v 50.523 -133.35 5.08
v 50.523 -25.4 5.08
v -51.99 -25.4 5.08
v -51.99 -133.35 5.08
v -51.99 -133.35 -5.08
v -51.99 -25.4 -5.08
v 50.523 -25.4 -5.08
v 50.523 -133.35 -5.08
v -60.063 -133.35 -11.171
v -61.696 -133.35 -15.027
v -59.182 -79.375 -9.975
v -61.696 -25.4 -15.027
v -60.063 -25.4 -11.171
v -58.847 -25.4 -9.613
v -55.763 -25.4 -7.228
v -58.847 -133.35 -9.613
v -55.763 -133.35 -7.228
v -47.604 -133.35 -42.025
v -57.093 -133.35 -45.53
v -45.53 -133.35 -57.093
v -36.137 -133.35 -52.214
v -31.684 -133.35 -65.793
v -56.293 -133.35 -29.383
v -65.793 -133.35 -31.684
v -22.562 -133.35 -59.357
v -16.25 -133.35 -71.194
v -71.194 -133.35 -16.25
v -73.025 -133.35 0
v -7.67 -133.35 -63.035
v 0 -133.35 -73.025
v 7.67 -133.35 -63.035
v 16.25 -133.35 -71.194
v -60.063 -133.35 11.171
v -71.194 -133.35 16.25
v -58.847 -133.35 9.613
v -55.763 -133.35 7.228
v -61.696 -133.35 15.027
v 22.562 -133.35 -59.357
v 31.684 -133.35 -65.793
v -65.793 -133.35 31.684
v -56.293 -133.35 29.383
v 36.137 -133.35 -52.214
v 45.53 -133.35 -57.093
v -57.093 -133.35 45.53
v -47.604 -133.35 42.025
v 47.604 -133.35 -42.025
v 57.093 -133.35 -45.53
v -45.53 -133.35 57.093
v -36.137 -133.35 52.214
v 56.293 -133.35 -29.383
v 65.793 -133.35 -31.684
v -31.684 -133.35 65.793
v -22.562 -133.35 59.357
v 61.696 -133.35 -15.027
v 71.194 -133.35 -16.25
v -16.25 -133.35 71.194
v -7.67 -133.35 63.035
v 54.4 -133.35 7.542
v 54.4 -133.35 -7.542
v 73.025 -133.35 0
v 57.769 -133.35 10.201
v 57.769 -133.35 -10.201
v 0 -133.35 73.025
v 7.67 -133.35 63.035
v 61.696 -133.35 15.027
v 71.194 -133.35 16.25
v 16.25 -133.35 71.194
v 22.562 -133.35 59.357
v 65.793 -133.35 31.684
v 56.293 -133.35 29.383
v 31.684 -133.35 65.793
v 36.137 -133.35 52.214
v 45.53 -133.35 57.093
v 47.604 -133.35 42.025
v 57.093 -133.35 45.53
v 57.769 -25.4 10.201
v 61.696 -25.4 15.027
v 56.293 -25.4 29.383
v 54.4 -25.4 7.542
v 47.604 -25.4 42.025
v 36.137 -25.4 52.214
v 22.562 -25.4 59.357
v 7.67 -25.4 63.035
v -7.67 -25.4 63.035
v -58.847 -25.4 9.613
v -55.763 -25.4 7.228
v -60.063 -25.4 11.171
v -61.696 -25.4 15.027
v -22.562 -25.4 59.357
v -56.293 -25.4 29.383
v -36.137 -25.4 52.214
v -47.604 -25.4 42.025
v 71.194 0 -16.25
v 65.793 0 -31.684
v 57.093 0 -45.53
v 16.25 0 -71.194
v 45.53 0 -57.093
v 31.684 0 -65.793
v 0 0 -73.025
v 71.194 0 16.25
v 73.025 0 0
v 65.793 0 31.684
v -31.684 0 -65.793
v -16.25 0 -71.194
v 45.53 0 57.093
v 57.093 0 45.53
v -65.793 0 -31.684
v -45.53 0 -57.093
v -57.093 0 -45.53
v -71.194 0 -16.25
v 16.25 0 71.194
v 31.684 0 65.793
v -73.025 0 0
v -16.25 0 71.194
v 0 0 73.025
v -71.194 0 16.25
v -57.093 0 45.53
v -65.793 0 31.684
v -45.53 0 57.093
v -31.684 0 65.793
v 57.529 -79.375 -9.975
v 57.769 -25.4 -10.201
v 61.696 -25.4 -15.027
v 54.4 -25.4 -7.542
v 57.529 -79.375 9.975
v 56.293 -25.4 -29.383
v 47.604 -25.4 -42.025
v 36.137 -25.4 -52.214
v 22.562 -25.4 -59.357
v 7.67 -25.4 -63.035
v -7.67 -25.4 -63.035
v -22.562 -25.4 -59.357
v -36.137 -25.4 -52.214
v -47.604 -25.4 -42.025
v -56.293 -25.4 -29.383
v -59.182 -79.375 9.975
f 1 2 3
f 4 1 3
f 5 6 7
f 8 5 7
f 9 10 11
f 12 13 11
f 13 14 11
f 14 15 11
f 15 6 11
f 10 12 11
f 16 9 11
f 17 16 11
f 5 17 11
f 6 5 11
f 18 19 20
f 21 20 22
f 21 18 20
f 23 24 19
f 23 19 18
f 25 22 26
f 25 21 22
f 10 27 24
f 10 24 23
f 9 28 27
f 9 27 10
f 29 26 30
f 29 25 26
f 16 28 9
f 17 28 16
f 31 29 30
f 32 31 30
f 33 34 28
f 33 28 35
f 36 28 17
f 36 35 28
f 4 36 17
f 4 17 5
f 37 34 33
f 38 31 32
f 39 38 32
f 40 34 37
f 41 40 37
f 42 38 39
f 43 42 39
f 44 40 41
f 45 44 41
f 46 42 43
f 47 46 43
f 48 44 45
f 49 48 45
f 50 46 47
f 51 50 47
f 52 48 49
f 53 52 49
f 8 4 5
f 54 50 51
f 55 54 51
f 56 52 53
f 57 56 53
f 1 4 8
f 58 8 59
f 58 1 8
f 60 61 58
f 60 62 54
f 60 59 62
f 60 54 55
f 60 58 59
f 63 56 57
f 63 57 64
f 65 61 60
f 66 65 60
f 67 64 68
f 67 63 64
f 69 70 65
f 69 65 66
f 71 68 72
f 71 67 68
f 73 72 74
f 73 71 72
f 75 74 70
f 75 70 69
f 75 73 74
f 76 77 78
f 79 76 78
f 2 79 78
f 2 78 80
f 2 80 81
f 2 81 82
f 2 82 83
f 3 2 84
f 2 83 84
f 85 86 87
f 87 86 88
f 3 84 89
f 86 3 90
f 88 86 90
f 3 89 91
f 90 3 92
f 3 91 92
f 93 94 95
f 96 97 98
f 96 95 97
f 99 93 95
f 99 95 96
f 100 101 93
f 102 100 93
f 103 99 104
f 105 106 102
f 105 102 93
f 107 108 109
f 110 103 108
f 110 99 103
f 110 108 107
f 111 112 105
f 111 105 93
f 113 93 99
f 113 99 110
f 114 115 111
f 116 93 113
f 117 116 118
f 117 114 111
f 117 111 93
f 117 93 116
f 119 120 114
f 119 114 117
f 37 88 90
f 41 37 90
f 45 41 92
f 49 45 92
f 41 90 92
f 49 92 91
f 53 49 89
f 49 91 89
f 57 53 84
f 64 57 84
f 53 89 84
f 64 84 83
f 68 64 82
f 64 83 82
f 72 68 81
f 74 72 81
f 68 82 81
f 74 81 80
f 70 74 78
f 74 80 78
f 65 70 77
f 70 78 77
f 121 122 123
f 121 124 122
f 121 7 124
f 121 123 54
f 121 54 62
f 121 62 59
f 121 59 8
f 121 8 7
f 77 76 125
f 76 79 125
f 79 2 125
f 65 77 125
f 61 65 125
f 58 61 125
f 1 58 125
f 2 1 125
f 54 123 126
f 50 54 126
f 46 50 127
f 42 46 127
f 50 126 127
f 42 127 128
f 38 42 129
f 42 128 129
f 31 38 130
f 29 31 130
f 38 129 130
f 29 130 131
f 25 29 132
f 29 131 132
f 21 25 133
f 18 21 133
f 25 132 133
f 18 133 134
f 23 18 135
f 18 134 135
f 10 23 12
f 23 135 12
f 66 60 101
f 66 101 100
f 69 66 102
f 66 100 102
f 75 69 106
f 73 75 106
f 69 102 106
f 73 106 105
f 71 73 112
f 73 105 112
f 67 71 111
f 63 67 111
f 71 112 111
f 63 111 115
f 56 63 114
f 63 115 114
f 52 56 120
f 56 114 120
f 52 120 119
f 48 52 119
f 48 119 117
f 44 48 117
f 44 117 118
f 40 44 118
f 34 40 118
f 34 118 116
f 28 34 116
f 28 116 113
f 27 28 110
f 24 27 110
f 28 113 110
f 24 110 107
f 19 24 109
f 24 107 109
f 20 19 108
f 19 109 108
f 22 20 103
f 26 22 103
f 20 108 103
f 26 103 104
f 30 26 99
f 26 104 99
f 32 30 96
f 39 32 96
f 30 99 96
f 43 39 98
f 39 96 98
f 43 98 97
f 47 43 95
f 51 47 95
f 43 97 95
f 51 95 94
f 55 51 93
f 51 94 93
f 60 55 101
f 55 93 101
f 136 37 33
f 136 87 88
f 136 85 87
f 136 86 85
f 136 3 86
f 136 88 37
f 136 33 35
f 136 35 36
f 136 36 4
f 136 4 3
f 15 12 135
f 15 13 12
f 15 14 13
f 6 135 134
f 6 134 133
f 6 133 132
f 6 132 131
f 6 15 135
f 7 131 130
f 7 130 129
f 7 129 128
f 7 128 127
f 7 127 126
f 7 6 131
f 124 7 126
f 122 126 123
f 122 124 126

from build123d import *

# Parameters (mm, degrees)
F0_R     = 73.025
F1_DEPTH = 133.35
F2_DEPTH = 25.4


with BuildPart() as f1:
    # F0 (on Front) → F1 (new body)
    with BuildSketch(Plane.XZ):
        Circle(F0_R)
        with BuildLine():
            ThreePointArc((63.2964738354, 5.08), (63.4490980572, 2.5420377112), (63.5, 0))
            ThreePointArc((63.5, 0), (63.4490980572, -2.5420377112), (63.2964738354, -5.08))
            ThreePointArc((63.2964738354, -5.08), (62.6939870382, -10.0853353566), (61.696322928, -15.0271000916))
            ThreePointArc((61.696322928, -15.0271000916), (0, -63.5), (-61.696322928, -15.0271000916))
            ThreePointArc((-61.696322928, -15.0271000916), (-62.6939870382, -10.0853353566), (-63.2964738354, -5.08))
            ThreePointArc((-63.2964738354, -5.08), (-63.5, 0), (-63.2964738354, 5.08))
            ThreePointArc((-63.2964738354, 5.08), (-62.6939870382, 10.0853353566), (-61.696322928, 15.0271000916))
            ThreePointArc((-61.696322928, 15.0271000916), (0, 63.5), (61.696322928, 15.0271000916))
            ThreePointArc((61.696322928, 15.0271000916), (62.6939870382, 10.0853353566), (63.2964738354, 5.08))
        make_face(mode=Mode.SUBTRACT)
        with BuildLine():
            ThreePointArc((63.2964738354, -5.08), (63.4490980572, -2.5420377112), (63.5, 0))
            ThreePointArc((63.5, 0), (63.4490980572, 2.5420377112), (63.2964738354, 5.08))
            Line((63.2964738354, 5.08), (50.5231209099, 5.08))
            Line((50.5231209099, 5.08), (-8.6646769196, 5.08))
            Line((-8.6646769196, 5.08), (-51.9901923835, 5.08))
            Line((-51.9901923835, 5.08), (-63.2964738354, 5.08))
            ThreePointArc((-63.2964738354, 5.08), (-63.5, 0), (-63.2964738354, -5.08))
            Line((-63.2964738354, -5.08), (-51.9901923835, -5.08))
            Line((-51.9901923835, -5.08), (-8.6646769196, -5.08))
            Line((-8.6646769196, -5.08), (50.5231209099, -5.08))
            Line((50.5231209099, -5.08), (63.2964738354, -5.08))
        make_face()
        with BuildLine():
            Line((50.5231209099, 5.08), (63.2964738354, 5.08))
            ThreePointArc((63.2964738354, 5.08), (62.6939870382, 10.0853353566), (61.696322928, 15.0271000916))
            add(Edge.make_bspline(
                [(61.696322928, 15.0271000916), (60.4599662433, 13.2835631459), (57.8112317295, 9.5482604282), (53.0577875896, 6.6339762092), (50.5231209099, 5.08)],
                knots=[0, 0, 0, 0, 0.4667725958, 1, 1, 1, 1], degree=3))
        make_face()
        with BuildLine():
            ThreePointArc((61.696322928, -15.0271000916), (62.6939870382, -10.0853353566), (63.2964738354, -5.08))
            Line((63.2964738354, -5.08), (50.5231209099, -5.08))
            add(Edge.make_bspline(
                [(61.696322928, -15.0271000916), (60.4599662433, -13.2835631459), (57.8112317295, -9.5482604282), (53.0577875896, -6.6339762092), (50.5231209099, -5.08)],
                knots=[0, 0, 0, 0, 0.4667725958, 1, 1, 1, 1], degree=3))
        make_face()
        with BuildLine():
            add(Edge.make_bspline(
                [(-61.696322928, 15.0271000916), (-61.1179777584, 13.2619750664), (-59.7584225638, 9.3012859588), (-54.7646458459, 6.5824467775), (-51.9901923835, 5.08)],
                knots=[0, 0, 0, 0, 0.4461018831, 1, 1, 1, 1], degree=3))
            ThreePointArc((-61.696322928, 15.0271000916), (-62.6939870382, 10.0853353566), (-63.2964738354, 5.08))
            Line((-63.2964738354, 5.08), (-51.9901923835, 5.08))
        make_face()
        with BuildLine():
            ThreePointArc((-63.2964738354, -5.08), (-62.6939870382, -10.0853353566), (-61.696322928, -15.0271000916))
            add(Edge.make_bspline(
                [(-61.696322928, -15.0271000916), (-61.1179777584, -13.2619750664), (-59.7584225638, -9.3012859588), (-54.7646458459, -6.5824467775), (-51.9901923835, -5.08)],
                knots=[0, 0, 0, 0, 0.4461018831, 1, 1, 1, 1], degree=3))
            Line((-51.9901923835, -5.08), (-63.2964738354, -5.08))
        make_face()
    extrude(amount=F1_DEPTH)

    # F0 (on Front) → F2 (join)
    with BuildSketch(Plane.XZ):
        with BuildLine():
            add(Edge.make_bspline(
                [(61.696322928, 15.0271000916), (60.4599662433, 13.2835631459), (57.8112317295, 9.5482604282), (53.0577875896, 6.6339762092), (50.5231209099, 5.08)],
                knots=[0, 0, 0, 0, 0.4667725958, 1, 1, 1, 1], degree=3))
            ThreePointArc((61.696322928, 15.0271000916), (0, 63.5), (-61.696322928, 15.0271000916))
            add(Edge.make_bspline(
                [(-61.696322928, 15.0271000916), (-61.1179777584, 13.2619750664), (-59.7584225638, 9.3012859588), (-54.7646458459, 6.5824467775), (-51.9901923835, 5.08)],
                knots=[0, 0, 0, 0, 0.4461018831, 1, 1, 1, 1], degree=3))
            Line((-51.9901923835, 5.08), (-8.6646769196, 5.08))
            Line((-8.6646769196, 5.08), (50.5231209099, 5.08))
        make_face()
        with BuildLine():
            ThreePointArc((-61.696322928, -15.0271000916), (0, -63.5), (61.696322928, -15.0271000916))
            add(Edge.make_bspline(
                [(61.696322928, -15.0271000916), (60.4599662433, -13.2835631459), (57.8112317295, -9.5482604282), (53.0577875896, -6.6339762092), (50.5231209099, -5.08)],
                knots=[0, 0, 0, 0, 0.4667725958, 1, 1, 1, 1], degree=3))
            Line((50.5231209099, -5.08), (-8.6646769196, -5.08))
            Line((-8.6646769196, -5.08), (-51.9901923835, -5.08))
            add(Edge.make_bspline(
                [(-61.696322928, -15.0271000916), (-61.1179777584, -13.2619750664), (-59.7584225638, -9.3012859588), (-54.7646458459, -6.5824467775), (-51.9901923835, -5.08)],
                knots=[0, 0, 0, 0, 0.4461018831, 1, 1, 1, 1], degree=3))
        make_face()
    extrude(amount=F2_DEPTH)


solid = f1.part
